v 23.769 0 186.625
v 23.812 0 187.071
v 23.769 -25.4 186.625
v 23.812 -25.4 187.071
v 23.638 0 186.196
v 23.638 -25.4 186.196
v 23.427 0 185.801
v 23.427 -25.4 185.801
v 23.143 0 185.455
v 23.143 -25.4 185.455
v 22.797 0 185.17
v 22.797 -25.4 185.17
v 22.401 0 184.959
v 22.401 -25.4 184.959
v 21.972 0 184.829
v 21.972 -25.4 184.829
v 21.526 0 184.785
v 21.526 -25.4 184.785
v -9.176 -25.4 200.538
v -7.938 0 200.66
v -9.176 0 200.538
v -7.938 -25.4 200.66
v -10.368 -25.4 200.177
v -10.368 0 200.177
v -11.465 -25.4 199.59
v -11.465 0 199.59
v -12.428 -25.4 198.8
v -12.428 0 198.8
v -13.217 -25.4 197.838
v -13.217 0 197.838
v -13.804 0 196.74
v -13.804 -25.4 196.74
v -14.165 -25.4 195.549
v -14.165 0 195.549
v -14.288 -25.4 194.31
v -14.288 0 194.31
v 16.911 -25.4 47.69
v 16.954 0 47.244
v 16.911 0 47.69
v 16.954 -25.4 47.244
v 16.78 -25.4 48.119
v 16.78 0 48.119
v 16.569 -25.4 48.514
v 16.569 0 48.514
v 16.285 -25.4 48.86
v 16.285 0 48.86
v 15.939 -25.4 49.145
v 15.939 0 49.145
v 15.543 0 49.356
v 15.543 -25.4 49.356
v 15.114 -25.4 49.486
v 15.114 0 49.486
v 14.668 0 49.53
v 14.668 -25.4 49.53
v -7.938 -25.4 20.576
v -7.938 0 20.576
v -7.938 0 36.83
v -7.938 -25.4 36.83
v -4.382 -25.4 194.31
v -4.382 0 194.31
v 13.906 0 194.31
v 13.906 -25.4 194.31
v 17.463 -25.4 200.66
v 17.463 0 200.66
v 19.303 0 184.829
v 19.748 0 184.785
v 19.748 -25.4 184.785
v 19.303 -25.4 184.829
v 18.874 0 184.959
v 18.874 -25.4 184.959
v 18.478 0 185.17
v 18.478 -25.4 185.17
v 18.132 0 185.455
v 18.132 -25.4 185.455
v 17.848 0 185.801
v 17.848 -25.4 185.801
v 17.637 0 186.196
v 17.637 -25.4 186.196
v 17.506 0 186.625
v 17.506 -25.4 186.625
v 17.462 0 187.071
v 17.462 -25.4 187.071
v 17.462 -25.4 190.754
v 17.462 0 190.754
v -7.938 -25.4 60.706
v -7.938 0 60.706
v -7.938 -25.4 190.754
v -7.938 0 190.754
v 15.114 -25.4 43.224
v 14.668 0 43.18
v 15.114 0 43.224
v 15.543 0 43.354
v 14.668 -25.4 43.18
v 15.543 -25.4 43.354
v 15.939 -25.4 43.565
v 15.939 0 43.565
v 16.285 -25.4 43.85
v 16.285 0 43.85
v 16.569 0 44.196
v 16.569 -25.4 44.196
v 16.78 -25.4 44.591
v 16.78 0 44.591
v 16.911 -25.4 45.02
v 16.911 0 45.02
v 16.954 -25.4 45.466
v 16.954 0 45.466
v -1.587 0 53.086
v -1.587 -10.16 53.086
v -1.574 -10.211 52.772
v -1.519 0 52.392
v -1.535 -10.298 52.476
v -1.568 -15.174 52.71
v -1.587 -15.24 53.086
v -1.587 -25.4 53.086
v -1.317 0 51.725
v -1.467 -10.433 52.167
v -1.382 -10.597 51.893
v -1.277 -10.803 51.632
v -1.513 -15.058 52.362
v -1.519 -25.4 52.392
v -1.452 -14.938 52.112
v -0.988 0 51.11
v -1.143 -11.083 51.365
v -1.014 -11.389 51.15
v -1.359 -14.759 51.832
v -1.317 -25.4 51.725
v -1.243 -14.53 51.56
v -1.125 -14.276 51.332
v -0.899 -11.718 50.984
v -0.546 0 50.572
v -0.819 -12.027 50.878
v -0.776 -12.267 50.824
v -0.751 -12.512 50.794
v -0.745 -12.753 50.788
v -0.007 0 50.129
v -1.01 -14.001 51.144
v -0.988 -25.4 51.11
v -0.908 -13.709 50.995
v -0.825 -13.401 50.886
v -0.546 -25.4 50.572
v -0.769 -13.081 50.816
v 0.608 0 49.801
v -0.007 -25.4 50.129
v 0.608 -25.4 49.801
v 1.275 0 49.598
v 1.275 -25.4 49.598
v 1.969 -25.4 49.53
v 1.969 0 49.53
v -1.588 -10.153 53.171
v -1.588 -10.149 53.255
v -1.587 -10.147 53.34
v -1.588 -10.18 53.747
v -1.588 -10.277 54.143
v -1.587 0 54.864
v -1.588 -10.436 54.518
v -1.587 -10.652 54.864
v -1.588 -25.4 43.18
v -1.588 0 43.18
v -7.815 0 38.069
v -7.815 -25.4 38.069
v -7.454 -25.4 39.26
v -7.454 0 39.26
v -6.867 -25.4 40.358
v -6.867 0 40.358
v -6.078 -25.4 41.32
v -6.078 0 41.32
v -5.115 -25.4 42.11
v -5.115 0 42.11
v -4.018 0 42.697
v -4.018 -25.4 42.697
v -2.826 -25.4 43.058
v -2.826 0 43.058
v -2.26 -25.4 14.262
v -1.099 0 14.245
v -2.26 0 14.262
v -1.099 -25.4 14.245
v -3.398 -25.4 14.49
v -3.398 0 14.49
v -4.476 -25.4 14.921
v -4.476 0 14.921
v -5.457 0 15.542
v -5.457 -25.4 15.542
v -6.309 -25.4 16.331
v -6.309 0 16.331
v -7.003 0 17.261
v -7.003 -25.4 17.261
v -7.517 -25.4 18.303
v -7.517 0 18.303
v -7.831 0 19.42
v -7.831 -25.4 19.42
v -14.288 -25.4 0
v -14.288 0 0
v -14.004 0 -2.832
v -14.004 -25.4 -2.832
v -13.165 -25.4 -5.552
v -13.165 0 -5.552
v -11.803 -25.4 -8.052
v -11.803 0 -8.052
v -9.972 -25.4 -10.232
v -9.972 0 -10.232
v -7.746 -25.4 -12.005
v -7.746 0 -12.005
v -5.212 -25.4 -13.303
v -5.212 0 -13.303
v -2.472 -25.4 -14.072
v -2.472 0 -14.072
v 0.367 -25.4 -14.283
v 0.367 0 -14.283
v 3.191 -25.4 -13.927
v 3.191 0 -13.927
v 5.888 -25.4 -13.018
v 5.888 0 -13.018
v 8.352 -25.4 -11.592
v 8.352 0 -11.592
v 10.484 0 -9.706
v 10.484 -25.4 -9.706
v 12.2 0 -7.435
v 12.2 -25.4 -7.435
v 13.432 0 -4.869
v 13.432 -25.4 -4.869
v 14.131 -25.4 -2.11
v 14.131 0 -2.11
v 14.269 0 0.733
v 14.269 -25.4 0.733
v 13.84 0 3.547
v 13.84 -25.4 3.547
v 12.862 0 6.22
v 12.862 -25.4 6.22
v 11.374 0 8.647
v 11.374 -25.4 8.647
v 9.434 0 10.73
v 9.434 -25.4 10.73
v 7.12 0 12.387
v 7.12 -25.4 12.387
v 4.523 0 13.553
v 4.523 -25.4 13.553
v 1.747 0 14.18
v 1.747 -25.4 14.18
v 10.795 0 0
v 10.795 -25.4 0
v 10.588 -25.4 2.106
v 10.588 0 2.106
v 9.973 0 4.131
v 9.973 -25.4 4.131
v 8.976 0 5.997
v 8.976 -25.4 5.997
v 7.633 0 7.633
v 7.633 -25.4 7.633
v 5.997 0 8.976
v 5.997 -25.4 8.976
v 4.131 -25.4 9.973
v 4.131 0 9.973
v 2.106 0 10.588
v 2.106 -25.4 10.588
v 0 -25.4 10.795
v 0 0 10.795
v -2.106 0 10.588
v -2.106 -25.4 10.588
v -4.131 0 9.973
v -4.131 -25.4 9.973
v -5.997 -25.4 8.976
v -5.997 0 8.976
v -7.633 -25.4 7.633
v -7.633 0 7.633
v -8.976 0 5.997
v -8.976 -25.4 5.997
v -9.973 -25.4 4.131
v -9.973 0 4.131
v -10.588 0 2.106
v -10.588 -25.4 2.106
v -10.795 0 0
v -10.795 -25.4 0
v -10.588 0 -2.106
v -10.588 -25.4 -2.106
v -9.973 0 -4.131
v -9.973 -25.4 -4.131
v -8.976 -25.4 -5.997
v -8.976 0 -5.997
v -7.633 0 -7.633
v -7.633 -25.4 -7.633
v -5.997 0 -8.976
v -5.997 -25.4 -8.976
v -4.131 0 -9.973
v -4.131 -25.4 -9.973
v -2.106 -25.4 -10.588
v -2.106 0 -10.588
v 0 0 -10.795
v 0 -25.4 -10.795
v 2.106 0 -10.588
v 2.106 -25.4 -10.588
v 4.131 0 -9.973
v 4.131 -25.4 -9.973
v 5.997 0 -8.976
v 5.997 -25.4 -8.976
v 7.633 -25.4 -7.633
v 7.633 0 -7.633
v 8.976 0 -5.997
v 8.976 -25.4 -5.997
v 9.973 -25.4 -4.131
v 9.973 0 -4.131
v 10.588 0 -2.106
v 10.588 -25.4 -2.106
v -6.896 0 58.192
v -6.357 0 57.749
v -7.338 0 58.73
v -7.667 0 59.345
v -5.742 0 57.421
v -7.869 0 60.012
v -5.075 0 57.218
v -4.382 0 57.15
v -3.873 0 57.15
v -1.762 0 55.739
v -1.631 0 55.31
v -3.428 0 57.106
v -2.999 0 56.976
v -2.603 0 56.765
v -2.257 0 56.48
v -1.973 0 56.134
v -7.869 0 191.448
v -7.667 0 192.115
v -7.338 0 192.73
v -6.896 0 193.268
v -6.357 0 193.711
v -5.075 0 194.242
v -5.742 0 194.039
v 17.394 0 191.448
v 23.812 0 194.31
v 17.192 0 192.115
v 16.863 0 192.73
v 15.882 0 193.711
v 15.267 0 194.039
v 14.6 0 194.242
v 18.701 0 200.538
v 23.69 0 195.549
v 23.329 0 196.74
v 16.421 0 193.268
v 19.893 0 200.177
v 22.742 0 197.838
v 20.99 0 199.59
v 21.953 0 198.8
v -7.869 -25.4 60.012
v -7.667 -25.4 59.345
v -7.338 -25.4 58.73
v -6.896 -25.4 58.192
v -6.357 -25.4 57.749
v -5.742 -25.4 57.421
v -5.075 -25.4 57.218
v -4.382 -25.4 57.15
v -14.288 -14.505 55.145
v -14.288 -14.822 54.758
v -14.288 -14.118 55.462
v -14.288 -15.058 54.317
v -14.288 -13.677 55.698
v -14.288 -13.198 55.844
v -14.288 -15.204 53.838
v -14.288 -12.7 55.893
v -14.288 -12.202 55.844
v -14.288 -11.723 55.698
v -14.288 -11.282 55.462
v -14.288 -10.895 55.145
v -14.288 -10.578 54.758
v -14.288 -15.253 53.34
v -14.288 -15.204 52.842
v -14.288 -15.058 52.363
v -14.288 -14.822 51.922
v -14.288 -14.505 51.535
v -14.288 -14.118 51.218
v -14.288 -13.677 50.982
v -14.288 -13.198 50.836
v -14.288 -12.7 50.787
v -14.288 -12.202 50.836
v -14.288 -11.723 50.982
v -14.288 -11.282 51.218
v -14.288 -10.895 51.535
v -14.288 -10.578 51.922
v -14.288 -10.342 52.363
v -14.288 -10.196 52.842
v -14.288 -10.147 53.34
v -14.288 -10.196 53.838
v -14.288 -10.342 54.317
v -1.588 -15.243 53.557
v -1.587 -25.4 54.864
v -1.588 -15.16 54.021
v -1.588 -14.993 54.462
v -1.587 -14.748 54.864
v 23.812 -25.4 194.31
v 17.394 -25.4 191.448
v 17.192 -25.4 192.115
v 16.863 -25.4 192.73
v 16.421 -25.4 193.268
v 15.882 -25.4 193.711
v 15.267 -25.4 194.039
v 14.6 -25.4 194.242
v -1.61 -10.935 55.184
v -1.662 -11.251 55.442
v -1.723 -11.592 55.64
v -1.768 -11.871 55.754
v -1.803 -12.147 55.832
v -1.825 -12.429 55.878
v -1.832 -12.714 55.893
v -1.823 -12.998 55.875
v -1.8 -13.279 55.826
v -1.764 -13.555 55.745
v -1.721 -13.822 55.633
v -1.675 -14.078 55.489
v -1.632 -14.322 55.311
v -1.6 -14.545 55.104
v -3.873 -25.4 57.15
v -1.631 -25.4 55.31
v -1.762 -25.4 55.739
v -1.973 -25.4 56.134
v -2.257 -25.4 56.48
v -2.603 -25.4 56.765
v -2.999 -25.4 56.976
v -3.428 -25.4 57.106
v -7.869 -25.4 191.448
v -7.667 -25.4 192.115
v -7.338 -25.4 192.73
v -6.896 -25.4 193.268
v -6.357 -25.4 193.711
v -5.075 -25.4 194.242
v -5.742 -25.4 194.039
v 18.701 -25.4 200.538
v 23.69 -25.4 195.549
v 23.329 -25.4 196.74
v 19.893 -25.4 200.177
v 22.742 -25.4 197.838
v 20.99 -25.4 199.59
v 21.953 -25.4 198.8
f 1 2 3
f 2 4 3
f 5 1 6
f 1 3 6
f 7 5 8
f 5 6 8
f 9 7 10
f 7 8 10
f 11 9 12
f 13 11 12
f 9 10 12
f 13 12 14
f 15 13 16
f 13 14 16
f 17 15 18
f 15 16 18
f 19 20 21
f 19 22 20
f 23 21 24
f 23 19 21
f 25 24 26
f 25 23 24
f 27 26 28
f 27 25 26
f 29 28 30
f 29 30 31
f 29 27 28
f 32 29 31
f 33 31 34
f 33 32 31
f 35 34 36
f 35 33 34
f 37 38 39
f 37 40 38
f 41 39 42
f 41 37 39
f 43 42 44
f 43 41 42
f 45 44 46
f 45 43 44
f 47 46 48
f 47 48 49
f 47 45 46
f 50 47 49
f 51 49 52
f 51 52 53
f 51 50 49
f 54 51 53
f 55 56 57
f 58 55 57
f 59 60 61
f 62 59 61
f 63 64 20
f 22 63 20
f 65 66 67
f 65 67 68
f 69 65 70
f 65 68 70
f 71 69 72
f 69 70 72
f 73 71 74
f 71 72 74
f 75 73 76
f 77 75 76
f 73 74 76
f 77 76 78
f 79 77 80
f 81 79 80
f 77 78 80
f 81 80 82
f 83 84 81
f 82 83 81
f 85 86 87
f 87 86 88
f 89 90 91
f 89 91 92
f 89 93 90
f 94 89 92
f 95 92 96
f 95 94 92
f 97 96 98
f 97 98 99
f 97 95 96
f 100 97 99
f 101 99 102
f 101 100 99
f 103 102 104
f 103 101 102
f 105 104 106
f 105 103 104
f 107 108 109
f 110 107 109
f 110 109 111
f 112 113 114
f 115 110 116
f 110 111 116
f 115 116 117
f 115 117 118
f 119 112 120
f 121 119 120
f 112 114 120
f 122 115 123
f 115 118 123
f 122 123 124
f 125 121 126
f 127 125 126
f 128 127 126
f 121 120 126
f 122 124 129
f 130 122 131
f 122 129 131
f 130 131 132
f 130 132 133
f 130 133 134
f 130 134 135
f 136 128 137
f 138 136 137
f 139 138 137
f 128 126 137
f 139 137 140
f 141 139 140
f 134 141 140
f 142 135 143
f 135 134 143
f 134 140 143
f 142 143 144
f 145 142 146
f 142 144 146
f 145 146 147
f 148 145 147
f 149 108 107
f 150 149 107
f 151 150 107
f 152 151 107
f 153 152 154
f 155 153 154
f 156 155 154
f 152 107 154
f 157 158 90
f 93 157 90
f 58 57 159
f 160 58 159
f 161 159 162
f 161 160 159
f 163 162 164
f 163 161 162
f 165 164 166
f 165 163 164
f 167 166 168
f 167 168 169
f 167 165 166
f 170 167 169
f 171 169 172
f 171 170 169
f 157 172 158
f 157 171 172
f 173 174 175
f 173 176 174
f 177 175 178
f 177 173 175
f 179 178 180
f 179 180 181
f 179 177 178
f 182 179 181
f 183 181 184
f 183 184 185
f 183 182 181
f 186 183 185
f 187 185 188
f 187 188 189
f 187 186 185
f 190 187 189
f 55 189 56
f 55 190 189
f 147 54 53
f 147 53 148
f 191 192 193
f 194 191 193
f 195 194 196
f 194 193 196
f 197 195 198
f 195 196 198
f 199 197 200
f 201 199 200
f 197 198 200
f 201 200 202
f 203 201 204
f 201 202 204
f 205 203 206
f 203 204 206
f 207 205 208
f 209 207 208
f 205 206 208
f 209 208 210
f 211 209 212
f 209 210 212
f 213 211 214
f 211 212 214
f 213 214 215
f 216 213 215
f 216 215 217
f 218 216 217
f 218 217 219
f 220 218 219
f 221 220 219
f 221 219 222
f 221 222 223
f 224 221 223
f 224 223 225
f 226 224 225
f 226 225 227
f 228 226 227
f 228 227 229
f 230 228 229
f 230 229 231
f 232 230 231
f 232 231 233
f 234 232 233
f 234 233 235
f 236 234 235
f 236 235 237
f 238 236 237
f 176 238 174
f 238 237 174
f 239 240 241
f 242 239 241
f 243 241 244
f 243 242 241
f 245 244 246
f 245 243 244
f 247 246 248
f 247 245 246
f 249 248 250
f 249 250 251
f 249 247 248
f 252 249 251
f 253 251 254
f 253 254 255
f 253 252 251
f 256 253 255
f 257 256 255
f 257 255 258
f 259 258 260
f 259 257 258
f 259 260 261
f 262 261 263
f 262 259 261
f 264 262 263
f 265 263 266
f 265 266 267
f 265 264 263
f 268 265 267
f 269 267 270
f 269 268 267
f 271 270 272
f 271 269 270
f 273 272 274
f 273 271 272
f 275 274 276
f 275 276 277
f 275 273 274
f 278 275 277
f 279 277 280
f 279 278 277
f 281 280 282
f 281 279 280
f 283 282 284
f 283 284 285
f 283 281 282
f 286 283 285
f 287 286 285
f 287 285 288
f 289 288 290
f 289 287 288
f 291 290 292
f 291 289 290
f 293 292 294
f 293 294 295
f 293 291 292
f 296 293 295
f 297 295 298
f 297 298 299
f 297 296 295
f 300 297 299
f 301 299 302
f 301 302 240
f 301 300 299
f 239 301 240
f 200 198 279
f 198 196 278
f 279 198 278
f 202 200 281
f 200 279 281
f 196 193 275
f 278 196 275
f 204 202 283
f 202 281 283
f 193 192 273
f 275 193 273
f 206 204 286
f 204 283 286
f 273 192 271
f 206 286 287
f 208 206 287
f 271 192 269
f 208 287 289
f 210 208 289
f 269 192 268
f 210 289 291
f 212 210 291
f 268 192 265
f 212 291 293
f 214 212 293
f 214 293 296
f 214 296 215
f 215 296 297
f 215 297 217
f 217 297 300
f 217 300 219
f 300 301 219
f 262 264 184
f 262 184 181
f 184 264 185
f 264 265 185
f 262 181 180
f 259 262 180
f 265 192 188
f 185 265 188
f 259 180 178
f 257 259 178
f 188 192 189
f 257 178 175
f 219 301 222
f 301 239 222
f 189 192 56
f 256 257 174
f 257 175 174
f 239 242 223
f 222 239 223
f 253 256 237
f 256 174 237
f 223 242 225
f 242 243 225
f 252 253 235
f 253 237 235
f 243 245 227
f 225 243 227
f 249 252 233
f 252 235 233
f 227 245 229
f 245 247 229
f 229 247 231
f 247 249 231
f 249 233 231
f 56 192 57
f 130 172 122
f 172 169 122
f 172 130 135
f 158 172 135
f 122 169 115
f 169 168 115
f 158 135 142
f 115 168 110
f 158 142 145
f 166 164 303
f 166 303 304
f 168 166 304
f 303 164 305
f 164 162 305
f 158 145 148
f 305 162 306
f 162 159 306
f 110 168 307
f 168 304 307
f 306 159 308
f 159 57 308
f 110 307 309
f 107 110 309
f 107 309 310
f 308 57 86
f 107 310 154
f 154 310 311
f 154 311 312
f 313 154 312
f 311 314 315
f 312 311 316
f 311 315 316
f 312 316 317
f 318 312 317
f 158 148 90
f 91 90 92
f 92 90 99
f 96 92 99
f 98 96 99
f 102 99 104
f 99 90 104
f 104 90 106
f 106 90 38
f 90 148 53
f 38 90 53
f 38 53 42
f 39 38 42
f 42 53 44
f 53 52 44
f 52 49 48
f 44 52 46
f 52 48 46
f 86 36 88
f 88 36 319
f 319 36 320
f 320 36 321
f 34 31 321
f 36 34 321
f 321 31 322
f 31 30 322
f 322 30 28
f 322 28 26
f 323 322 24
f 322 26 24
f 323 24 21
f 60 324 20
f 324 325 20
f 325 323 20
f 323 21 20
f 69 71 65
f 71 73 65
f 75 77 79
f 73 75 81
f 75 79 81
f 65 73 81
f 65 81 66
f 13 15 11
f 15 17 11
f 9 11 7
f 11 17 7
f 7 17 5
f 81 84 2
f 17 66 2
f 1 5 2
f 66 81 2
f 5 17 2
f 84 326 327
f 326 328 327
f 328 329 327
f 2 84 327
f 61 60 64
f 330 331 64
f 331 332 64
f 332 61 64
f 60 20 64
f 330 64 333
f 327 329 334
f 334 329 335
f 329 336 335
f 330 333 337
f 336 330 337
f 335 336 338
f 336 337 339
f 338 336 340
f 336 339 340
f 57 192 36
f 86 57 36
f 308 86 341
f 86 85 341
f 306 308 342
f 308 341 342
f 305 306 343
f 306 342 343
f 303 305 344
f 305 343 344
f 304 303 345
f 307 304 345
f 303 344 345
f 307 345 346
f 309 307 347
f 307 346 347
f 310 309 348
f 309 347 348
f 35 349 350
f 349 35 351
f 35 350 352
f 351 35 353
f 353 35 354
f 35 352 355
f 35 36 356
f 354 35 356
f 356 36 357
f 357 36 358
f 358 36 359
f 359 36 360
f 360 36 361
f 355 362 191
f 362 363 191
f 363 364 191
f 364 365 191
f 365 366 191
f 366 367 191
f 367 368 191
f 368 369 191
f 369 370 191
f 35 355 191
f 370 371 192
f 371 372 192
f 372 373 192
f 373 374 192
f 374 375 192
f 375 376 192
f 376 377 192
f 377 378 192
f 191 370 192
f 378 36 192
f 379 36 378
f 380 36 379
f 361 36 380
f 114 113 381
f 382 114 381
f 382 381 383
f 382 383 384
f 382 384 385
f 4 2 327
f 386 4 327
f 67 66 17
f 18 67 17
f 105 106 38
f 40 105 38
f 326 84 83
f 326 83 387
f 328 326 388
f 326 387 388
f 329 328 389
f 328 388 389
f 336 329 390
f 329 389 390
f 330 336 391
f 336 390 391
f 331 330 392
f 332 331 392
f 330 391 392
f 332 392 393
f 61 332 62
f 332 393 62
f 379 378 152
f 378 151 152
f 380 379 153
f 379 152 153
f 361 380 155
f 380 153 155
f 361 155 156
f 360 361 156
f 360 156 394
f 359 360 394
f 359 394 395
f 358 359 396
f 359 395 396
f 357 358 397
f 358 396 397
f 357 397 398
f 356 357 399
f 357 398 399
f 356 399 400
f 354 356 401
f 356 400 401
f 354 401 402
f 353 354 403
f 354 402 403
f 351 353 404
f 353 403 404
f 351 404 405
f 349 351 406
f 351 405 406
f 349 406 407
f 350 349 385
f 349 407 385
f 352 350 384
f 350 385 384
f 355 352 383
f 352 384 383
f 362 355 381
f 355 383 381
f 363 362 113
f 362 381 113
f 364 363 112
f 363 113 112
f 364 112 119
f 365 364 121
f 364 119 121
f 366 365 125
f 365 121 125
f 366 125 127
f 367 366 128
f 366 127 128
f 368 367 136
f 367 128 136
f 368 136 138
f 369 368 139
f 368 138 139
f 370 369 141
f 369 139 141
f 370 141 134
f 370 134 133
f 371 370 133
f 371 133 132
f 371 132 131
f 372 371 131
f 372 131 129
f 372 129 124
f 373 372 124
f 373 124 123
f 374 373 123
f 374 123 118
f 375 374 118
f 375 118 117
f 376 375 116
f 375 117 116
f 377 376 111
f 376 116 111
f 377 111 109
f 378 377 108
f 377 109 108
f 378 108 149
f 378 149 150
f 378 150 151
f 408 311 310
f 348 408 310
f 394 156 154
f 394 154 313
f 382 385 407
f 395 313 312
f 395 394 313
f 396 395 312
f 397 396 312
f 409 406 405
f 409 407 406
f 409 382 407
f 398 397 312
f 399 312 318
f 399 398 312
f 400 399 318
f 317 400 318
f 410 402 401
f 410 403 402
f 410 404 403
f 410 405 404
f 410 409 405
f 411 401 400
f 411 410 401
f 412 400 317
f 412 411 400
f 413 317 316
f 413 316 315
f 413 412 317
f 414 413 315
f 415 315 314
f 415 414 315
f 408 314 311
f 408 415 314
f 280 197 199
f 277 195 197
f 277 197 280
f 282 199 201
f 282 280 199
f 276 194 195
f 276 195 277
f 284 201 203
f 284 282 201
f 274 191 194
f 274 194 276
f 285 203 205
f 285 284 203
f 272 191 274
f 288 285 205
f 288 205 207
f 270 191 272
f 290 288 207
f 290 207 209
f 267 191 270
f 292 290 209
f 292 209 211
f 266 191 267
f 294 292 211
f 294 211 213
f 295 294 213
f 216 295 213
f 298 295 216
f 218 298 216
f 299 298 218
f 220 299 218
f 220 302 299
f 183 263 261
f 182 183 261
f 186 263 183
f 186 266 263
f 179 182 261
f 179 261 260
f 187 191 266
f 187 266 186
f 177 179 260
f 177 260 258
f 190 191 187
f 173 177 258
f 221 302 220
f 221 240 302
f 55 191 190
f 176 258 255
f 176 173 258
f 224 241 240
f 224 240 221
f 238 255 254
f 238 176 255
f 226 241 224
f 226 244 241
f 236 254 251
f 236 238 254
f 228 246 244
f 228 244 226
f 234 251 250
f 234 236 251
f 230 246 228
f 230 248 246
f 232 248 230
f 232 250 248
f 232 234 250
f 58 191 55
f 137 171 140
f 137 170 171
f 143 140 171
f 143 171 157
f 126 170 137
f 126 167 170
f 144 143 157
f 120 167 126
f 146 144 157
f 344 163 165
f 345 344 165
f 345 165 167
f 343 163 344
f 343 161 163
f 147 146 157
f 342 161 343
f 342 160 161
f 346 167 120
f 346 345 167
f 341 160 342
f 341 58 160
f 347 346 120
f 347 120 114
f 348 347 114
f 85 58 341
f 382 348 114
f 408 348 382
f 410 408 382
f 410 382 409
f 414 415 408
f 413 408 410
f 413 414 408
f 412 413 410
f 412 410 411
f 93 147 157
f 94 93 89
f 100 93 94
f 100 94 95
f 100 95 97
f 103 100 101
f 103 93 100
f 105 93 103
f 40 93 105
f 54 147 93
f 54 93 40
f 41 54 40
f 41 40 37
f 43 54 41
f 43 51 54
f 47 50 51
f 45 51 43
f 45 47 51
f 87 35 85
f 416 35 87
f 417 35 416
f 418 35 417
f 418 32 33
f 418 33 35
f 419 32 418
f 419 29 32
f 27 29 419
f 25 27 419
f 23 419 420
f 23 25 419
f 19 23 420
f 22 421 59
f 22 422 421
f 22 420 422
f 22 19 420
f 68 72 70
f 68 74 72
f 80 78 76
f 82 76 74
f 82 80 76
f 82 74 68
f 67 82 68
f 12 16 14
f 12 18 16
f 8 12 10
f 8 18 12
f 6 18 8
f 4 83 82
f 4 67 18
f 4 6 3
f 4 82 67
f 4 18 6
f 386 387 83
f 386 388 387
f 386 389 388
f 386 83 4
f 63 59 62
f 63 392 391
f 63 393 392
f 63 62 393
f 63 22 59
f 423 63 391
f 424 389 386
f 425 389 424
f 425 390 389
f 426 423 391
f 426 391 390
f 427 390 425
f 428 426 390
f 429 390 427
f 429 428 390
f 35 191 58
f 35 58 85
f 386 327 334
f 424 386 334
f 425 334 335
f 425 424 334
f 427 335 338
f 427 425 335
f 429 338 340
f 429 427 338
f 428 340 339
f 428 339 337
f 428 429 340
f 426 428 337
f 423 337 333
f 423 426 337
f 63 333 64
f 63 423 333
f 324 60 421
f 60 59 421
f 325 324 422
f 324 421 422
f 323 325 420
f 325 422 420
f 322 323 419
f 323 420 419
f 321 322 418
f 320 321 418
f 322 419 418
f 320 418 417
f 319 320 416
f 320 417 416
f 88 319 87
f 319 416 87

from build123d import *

# Parameters (mm, degrees)
F0_R     = 10.795
F1_DEPTH = 25.4
F2_R     = 2.286
F3_R     = 3.556
F4_R     = 6.35
F5_R     = 2.5527
F6_DEPTH = 12.7


with BuildPart() as f1:
    # F0 (on Front) → F1 (new body)
    with BuildSketch(Plane.XZ):
        with BuildLine():
            Line((-14.2875, 200.66), (-14.2875, 0))
            ThreePointArc((-14.2875, 0), (12.600391, -6.735192), (-7.9375, 11.879762))
            Line((-7.9375, 11.879762), (-7.9375, 43.18))
            Line((-7.9375, 43.18), (16.9545, 43.18))
            Line((16.9545, 43.18), (16.9545, 49.53))
            Line((16.9545, 49.53), (-1.5875, 49.53))
            Line((-1.5875, 49.53), (-1.5875, 57.15))
            Line((-1.5875, 57.15), (-7.9375, 57.15))
            Line((-7.9375, 57.15), (-7.9375, 194.31))
            Line((-7.9375, 194.31), (17.4625, 194.31))
            Line((17.4625, 194.31), (17.4625, 184.785))
            Line((17.4625, 184.785), (23.8125, 184.785))
            Line((23.8125, 184.785), (23.8125, 200.66))
            Line((23.8125, 200.66), (-14.2875, 200.66))
        make_face()
        Circle(F0_R, mode=Mode.SUBTRACT)
    extrude(amount=F1_DEPTH)

    # F2
    f2_edges = [f1.edges().sort_by_distance(p)[0] for p in [
        (16.9545, -12.7, 43.18),
        (16.9545, -12.7, 49.53),
        (23.8125, -12.7, 184.785),
        (17.4625, -12.7, 184.785),
        (-1.5875, -12.7, 57.15),
    ]]
    fillet(f2_edges, radius=F2_R)

    # F3
    f3_edges = [f1.edges().sort_by_distance(p)[0] for p in [
        (17.4625, -12.7, 194.31),
        (-7.9375, -12.7, 194.31),
        (-7.9375, -12.7, 57.15),
        (-1.5875, -12.7, 49.53),
    ]]
    fillet(f3_edges, radius=F3_R)

    # F4
    f4_edges = [f1.edges().sort_by_distance(p)[0] for p in [
        (-7.9375, -12.7, 43.18),
        (23.8125, -12.7, 200.66),
        (-14.2875, -12.7, 200.66),
        (-7.9375, -12.7, 11.879762),
    ]]
    fillet(f4_edges, radius=F4_R)

    # F5 (on face) → F6 (cut, symmetric)
    with BuildSketch(Plane.YZ.offset(-7.9375)):
        with Locations((-12.7, 53.34)):
            Circle(F5_R)
    extrude(amount=F6_DEPTH, both=True, mode=Mode.SUBTRACT)


solid = f1.part
